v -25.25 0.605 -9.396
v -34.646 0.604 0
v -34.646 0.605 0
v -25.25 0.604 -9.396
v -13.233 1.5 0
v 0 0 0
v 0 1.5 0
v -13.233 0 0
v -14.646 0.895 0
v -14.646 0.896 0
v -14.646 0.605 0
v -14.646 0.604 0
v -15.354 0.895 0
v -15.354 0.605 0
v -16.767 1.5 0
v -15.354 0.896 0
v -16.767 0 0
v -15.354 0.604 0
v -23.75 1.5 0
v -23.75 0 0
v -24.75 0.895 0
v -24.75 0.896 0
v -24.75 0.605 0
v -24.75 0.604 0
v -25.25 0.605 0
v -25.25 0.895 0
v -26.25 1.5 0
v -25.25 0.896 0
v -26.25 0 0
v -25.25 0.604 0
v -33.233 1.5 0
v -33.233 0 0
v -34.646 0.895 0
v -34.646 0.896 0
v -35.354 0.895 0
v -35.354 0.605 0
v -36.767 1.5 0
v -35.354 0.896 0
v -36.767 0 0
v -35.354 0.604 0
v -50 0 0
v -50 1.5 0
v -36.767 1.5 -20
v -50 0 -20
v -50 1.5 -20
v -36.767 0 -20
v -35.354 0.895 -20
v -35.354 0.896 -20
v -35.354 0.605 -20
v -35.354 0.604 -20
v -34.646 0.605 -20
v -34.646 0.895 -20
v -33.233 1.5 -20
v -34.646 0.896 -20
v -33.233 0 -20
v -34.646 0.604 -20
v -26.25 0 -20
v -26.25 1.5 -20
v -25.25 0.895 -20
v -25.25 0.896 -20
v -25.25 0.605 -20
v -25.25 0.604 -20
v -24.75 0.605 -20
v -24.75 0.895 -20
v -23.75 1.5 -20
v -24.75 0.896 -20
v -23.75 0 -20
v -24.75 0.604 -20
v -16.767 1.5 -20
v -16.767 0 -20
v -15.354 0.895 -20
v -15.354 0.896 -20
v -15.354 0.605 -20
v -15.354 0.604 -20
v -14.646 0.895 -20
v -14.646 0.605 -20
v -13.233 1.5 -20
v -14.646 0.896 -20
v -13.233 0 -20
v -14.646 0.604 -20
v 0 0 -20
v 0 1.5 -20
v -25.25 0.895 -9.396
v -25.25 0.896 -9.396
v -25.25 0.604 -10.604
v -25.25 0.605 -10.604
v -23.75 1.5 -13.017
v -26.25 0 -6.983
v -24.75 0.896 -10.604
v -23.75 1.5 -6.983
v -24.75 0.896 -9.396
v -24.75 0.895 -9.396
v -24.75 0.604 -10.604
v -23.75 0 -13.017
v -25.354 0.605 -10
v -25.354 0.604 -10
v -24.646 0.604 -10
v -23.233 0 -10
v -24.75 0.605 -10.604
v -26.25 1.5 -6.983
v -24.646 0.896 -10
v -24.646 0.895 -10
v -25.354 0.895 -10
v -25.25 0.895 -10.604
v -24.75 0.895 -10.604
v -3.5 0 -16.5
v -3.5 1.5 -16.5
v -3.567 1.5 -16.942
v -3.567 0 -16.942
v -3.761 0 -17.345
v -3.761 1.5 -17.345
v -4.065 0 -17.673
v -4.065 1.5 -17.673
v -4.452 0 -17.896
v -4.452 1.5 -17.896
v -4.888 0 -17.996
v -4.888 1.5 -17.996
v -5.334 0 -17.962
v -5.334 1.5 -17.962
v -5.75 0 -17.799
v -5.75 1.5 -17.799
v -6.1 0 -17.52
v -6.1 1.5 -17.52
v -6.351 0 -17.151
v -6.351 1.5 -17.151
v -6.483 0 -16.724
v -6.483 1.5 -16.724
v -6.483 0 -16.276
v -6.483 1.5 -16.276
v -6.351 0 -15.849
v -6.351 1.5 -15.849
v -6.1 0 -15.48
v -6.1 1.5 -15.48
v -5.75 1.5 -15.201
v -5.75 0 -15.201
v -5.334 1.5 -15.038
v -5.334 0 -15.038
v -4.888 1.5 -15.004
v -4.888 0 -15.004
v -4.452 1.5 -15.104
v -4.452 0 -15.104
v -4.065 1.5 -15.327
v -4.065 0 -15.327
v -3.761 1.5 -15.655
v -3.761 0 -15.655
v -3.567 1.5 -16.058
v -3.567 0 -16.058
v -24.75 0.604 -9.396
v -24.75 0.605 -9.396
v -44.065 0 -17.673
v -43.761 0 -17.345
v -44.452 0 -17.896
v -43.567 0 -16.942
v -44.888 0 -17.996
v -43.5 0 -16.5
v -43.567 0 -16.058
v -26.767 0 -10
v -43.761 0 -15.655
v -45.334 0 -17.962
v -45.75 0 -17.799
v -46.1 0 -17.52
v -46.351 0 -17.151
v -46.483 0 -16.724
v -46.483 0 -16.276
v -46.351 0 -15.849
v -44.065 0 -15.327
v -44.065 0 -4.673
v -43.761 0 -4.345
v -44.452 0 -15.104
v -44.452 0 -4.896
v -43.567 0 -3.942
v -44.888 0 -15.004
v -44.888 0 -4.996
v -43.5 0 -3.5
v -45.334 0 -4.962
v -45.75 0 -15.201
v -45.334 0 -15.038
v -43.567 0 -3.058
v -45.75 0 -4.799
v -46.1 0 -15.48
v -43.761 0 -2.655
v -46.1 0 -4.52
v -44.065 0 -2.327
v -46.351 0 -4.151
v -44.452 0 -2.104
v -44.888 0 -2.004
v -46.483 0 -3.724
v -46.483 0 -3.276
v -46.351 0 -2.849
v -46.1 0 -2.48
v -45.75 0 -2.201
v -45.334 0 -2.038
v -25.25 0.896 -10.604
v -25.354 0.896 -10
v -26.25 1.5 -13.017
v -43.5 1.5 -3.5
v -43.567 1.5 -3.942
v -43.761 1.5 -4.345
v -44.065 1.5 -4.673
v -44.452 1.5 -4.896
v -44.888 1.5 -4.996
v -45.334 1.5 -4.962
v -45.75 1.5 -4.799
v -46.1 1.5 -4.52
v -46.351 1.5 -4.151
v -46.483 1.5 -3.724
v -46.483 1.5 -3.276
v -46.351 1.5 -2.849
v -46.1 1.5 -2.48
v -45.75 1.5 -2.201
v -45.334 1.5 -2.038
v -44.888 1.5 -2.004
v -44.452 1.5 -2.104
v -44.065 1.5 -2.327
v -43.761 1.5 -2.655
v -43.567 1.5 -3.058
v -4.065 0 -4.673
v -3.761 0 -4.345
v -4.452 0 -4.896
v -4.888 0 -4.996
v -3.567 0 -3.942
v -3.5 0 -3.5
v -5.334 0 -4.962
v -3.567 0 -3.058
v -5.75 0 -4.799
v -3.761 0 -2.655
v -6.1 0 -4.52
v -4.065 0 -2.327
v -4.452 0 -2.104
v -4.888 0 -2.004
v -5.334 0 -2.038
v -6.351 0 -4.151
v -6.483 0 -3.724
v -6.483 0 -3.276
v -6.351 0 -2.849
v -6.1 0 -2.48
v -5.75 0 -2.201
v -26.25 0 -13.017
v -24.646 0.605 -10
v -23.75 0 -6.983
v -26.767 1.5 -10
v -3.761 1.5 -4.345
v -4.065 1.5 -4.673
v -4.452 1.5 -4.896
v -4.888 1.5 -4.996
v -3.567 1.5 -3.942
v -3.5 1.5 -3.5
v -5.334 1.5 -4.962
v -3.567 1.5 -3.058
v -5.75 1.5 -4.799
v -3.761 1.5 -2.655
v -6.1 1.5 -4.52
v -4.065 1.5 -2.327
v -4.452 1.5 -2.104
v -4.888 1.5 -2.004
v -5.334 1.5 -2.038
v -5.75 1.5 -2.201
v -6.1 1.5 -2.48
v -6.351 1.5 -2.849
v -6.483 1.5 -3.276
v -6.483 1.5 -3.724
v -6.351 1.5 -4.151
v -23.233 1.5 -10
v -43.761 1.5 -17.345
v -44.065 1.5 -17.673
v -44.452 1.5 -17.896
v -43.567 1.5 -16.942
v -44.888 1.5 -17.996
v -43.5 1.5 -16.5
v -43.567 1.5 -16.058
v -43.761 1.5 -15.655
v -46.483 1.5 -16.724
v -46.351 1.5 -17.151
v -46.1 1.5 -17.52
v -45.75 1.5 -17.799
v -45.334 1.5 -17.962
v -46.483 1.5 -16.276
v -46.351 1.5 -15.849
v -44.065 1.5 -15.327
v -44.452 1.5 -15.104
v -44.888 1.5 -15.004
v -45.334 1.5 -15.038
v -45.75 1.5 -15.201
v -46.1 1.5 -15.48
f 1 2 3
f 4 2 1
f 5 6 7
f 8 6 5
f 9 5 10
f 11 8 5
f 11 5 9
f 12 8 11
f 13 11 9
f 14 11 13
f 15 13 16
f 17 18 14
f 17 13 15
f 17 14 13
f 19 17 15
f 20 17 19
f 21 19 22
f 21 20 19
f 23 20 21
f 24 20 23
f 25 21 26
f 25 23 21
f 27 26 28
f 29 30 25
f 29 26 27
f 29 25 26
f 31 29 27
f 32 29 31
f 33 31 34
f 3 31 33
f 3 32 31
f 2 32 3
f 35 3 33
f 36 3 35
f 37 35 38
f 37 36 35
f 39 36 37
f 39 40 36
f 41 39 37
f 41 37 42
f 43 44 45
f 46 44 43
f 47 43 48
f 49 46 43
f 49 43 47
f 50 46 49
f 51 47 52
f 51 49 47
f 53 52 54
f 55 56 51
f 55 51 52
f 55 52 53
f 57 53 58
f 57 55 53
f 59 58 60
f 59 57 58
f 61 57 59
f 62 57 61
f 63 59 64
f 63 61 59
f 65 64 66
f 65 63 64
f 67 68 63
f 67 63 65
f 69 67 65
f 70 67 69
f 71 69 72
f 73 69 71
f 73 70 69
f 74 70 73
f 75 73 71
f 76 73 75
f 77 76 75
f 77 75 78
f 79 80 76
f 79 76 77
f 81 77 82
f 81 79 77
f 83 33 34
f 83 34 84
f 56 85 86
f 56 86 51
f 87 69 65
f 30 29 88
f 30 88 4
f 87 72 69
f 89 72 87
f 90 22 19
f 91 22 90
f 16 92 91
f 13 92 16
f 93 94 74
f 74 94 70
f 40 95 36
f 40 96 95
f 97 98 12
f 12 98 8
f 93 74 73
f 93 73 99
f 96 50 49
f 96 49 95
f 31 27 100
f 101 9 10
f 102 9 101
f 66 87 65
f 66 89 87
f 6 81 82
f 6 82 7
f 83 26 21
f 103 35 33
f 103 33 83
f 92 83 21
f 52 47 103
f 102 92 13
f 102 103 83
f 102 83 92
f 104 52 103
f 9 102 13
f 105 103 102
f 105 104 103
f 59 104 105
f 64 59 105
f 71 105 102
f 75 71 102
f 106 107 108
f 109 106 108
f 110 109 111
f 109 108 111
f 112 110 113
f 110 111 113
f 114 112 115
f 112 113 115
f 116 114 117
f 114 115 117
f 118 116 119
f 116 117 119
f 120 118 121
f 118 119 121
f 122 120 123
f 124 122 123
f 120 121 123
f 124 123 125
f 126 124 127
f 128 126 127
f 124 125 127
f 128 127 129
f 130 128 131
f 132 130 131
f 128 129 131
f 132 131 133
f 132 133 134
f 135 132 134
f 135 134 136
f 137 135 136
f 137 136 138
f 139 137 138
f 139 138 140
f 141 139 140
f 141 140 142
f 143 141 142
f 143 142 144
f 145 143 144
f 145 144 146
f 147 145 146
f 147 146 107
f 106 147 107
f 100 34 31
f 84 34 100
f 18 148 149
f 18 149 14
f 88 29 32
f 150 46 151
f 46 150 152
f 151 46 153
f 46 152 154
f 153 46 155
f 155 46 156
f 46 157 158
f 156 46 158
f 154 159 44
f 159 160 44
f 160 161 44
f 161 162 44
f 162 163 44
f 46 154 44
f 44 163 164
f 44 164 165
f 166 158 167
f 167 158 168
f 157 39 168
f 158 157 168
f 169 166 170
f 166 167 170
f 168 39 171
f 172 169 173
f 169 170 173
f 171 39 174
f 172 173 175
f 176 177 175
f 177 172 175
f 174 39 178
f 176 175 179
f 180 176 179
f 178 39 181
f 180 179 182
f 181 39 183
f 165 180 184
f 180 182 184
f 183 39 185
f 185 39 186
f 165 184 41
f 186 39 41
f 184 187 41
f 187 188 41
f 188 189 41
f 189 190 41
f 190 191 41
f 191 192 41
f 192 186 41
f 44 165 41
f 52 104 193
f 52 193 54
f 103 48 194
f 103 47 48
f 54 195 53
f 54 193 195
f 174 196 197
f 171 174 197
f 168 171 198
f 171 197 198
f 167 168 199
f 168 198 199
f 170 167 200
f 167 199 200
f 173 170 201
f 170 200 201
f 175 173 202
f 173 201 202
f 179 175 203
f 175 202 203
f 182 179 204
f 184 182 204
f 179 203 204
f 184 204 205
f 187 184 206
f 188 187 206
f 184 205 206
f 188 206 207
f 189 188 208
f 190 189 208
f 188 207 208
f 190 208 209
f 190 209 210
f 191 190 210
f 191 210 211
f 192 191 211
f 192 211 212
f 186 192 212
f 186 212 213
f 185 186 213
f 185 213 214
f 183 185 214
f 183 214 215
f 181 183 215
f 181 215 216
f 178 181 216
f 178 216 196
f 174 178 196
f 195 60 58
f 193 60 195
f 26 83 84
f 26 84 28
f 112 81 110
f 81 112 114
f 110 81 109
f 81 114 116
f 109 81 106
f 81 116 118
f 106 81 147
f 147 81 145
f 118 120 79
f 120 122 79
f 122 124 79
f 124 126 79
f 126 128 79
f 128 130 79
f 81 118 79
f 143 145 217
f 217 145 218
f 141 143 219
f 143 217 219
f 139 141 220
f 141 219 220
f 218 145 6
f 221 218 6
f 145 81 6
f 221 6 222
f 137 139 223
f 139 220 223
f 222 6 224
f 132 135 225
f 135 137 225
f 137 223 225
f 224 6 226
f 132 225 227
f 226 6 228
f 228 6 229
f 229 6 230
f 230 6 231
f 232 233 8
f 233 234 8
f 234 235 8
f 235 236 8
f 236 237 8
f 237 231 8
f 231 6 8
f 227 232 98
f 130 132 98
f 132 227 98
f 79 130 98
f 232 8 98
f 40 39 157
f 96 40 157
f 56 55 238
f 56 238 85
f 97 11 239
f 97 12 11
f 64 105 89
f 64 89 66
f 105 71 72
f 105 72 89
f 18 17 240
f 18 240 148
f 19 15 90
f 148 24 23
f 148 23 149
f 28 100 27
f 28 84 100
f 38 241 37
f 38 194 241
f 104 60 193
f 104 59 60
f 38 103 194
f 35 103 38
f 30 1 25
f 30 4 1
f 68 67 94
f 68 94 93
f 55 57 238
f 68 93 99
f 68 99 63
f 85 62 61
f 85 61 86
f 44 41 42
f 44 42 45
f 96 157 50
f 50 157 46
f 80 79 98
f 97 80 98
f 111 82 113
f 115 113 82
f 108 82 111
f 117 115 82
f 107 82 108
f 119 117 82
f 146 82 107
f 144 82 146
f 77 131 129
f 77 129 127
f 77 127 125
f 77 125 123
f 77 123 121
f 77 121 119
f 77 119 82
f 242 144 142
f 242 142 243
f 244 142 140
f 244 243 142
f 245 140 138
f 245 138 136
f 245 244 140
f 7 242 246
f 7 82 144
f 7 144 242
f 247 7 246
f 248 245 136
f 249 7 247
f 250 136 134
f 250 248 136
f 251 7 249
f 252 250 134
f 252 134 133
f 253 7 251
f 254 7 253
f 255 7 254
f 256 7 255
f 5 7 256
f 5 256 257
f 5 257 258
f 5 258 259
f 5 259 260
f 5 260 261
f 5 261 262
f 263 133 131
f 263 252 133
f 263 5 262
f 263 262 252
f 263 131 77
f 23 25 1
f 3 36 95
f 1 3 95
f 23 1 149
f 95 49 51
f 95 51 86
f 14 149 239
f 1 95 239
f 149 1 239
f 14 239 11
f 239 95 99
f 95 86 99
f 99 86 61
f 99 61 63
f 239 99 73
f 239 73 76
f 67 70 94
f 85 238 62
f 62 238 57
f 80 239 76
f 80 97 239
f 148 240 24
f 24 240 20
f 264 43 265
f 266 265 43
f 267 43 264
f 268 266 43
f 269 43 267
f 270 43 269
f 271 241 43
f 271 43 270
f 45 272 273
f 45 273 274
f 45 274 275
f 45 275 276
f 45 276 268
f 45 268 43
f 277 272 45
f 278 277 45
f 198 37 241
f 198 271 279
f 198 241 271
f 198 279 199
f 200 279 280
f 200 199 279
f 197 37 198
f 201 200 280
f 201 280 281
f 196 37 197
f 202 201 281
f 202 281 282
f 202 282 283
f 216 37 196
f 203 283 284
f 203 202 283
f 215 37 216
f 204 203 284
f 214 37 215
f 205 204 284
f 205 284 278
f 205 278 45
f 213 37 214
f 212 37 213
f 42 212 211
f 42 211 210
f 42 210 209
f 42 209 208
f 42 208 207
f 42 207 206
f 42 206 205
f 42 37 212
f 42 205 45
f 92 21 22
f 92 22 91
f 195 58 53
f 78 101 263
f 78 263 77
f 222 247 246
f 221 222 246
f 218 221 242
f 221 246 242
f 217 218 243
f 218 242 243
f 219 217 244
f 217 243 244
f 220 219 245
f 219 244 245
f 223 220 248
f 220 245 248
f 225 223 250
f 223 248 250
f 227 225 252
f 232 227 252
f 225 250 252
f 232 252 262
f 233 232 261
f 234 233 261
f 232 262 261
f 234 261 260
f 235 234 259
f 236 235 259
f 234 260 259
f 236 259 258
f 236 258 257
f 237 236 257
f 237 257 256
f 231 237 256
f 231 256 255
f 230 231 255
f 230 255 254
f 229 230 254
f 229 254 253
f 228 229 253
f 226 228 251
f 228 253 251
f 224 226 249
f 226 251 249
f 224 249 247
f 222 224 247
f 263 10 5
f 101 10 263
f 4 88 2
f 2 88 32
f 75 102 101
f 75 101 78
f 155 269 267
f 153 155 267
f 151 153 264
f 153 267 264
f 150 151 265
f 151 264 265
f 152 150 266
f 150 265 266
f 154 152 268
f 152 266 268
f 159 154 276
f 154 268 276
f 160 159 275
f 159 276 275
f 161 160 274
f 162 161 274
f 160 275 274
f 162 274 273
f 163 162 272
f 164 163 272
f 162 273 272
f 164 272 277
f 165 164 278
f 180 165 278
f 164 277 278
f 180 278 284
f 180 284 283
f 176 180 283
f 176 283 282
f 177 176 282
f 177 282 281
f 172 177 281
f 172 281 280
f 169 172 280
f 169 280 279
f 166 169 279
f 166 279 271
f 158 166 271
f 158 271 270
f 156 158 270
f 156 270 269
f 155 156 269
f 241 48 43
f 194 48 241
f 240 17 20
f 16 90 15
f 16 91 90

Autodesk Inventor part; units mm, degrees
ref_plane "YZ Plane" through (0, 0, 0) normal (1, 0, 0) x (0, 1, 0)
ref_plane "XZ Plane" through (0, 0, 0) normal (0, 1, 0) x (-1, 0, 0)
ref_plane "XY Plane" through (0, 0, 0) normal (0, 0, 1) x (1, 0, 0)
sketch "Sketch1" plane through (0, 0, 0) normal (0, 1, 0) x (-1, 0, 0)
  line L0 (0, 0) -> (50, 0)
  line L1 (50, 0) -> (50, -20)
  line L2 (50, -20) -> (0, -20)
  line L3 (0, -20) -> (0, 0)
  line L4 (25, 0) -> (25, -20)
  line L5 (25, -20) -> (35, -20)
  line L6 (25, 0) -> (35, 0)
  line L7 (25, 0) -> (15, 0)
  line L8 (25, -20) -> (15, -20)
  line L9 (15, -20) -> (25, -10)
  line L10 (25, -10) -> (15, 0)
  line L11 (25, -10) -> (35, -20)
  line L12 (25, -10) -> (35, 0)
  line L13 (25.25, 2.5) -> (24.75, 2.5)
  line L14 (24.75, 2.5) -> (24.75, -22.5)
  line L15 (24.75, -22.5) -> (25.25, -22.5)
  line L16 (25.25, -22.5) -> (25.25, 2.5)
  line L17 (25.25, 2.5) -> (24.75, -22.5) construction
  line L18 (24.75, 2.5) -> (25.25, -22.5) construction
  line L19 (7.4991, 7.8544) -> (7.1456, 7.5009)
  line L20 (7.1456, 7.5009) -> (42.5009, -27.8544)
  line L21 (42.5009, -27.8544) -> (42.8544, -27.5009)
  line L22 (42.8544, -27.5009) -> (7.4991, 7.8544)
  line L23 (7.4991, 7.8544) -> (42.5009, -27.8544) construction
  line L24 (7.1456, 7.5009) -> (42.8544, -27.5009) construction
  line L25 (42.8544, 7.5009) -> (42.5009, 7.8544)
  line L26 (42.5009, 7.8544) -> (7.1456, -27.5009)
  line L27 (7.1456, -27.5009) -> (7.4991, -27.8544)
  line L28 (7.4991, -27.8544) -> (42.8544, 7.5009)
  line L29 (42.8544, 7.5009) -> (7.1456, -27.5009) construction
  line L30 (42.5009, 7.8544) -> (7.4991, -27.8544) construction
  point P0 (14.6464, -20)
  point P1 (24.6464, -10)
  point P2 (14.6464, 0)
  point P3 (24.75, -10.6036)
  point P4 (15.3536, -20)
  point P5 (24.75, -20)
  point P6 (34.6464, -20)
  point P7 (25.25, -10.6036)
  point P8 (25.25, -20)
  point P9 (15.3536, 0)
  point P10 (24.75, -9.3964)
  point P11 (24.75, 0)
  point P12 (25.25, -9.3964)
  point P13 (34.6464, 0)
  point P14 (25.25, 0)
  point P15 (35.3536, 0)
  point P16 (25.3536, -10)
  point P17 (35.3536, -20)
  dimension "d0" = 50
  dimension "d1" = 20
  dimension "d2" = 10
  dimension "d3" = 10
  dimension "d4" = 10
  dimension "d5" = 10
  dimension "d6" = 0.5
  dimension "d7" = 25
  dimension "d8" = 0.5
  dimension "d9" = 50
  dimension "d10" = 0.5
  dimension "d11" = 50
extrude "Extrusion1" add sketch "Sketch1" along normal blind 1.5 contours L0 L20 L26 L2 L3 | L0 L14 L22 | L28 L14 L2 | L0 L26 L16 | L20 L2 L16 | L28 L0 L1 L2 L22
ref_plane "Work Plane1" through (0, 0.75, 0) normal (0, 1, 0) x (1, 0, 0)
sketch "Sketch2" plane through (0, 0.75, 0) normal (0, 1, 0) x (1, 0, 0)
  line L0 (-50, 20) -> (-50, 0) projected
  line L1 (-35.3536, 20) -> (-50, 20) projected
  line L2 (-25.3536, 10) -> (-35.3536, 20) projected
  line L3 (-35.3536, 0) -> (-25.3536, 10) projected
  line L4 (-50, 0) -> (-35.3536, 0) projected
  line L5 (-25.25, 9.3964) -> (-34.6464, 0) projected
  line L6 (-25.25, 0) -> (-25.25, 9.3964) projected
  line L7 (-34.6464, 0) -> (-25.25, 0) projected
  line L8 (-24.75, 9.3964) -> (-24.75, 0) projected
  line L9 (-15.3536, 0) -> (-24.75, 9.3964) projected
  line L10 (-24.75, 0) -> (-15.3536, 0) projected
  line L11 (-24.6464, 10) -> (-14.6464, 0) projected
  line L12 (-14.6464, 20) -> (-24.6464, 10) projected
  line L13 (0, 20) -> (-14.6464, 20) projected
  line L14 (0, 0) -> (0, 20) projected
  line L15 (-14.6464, 0) -> (0, 0) projected
  line L16 (-15.3536, 20) -> (-24.75, 20) projected
  line L17 (-24.75, 10.6036) -> (-15.3536, 20) projected
  line L18 (-24.75, 20) -> (-24.75, 10.6036) projected
  line L19 (-25.25, 20) -> (-34.6464, 20) projected
  line L20 (-25.25, 10.6036) -> (-25.25, 20) projected
  line L21 (-34.6464, 20) -> (-25.25, 10.6036) projected
  line L22 (-50, 0) -> (-35.3536, 0) projected
  line L23 (-50, 0) -> (0, 0)
  line L24 (-50, 20) -> (0, 20)
extrude "Extrusion2" add sketch "Sketch2" along normal mid plane 0.29 contours L24 L21 L20 L18 L17 L12 L11 L23 L9 L8 L6 L5 L3 L2
chamfer "Chamfer1" distance 1 distance2 0.605 1 edges at (-30.3536, 1.5, -5) measured on face at (-40.2357, 1.5, -13.3333)
chamfer "Chamfer2" distance 1 distance2 0.605 1 edges at (-29.9482, 1.5, -4.6982) measured on face at (-28.3821, 1.5, -3.1321)
chamfer "Chamfer3" distance 1 distance2 0.605 1 edges at (-30.7069, 1.5, -15.3534) measured on face at (-40.7069, 1.5, -13.3333)
chamfer "Chamfer4" distance 1 distance2 0.605 1 edges at (-29.9482, 1.5, -15.3018) measured on face at (-28.3821, 1.5, -16.8679)
chamfer "Chamfer5" distance 1 distance2 0.605 1 edges at (-25.25, 1.5, -16.0085) measured on face at (-27.911, 1.5, -17.339)
chamfer "Chamfer6" distance 1 distance2 0.605 1 edges at (-24.75, 1.5, -15.3018) measured on face at (-21.6179, 1.5, -16.8679)
chamfer "Chamfer7" distance 1 distance2 0.605 1 edges at (-25.25, 1.5, -3.9915) measured on face at (-27.911, 1.5, -2.661)
chamfer "Chamfer8" distance 1 distance2 0.605 1 edges at (-24.75, 1.5, -4.6982) measured on face at (-21.6179, 1.5, -3.1321)
chamfer "Chamfer9" distance 1 distance2 0.605 1 edges at (-19.552, 1.5, -4.1985) measured on face at (-20.9515, 1.5, -2.799)
chamfer "Chamfer10" distance 1 distance2 0.605 1 edges at (-19.6464, 1.5, -5) measured on face at (-9.7643, 1.5, -6.6667)
chamfer "Chamfer11" distance 1 distance2 0.605 1 edges at (-19.552, 1.5, -15.8015) measured on face at (-20.9515, 1.5, -17.201)
chamfer "Chamfer12" distance 1 distance2 0.605 1 edges at (-19.2931, 1.5, -15.3534) measured on face at (-9.2931, 1.5, -13.3333)
chamfer "Chamfer13" distance 0.605 distance2 1 1 edges at (-29.9482, 0, -15.3018) measured on face at (-31.5143, 0.2017, -16.8679)
chamfer "Chamfer14" distance 0.605 distance2 1 1 edges at (-30.3536, 0, -15) measured on face at (-28.6869, 0.2017, -13.3333)
chamfer "Chamfer15" distance 0.605 distance2 1 1 edges at (-25.25, 0, -16.0085) measured on face at (-25.25, 0.4033, -14.2069)
chamfer "Chamfer16" distance 0.605 distance2 1 1 edges at (-24.75, 0, -15.3018) measured on face at (-24.75, 0.2017, -16.8679)
chamfer "Chamfer17" distance 0.605 distance2 1 1 edges at (-19.552, 0, -15.8015) measured on face at (-21.2847, 0.4033, -14.0689)
chamfer "Chamfer18" distance 0.605 distance2 1 1 edges at (-19.6464, 0, -15) measured on face at (-17.9798, 0.2017, -16.6667)
chamfer "Chamfer19" distance 0.605 distance2 1 1 edges at (-19.2931, 0, -4.6466) measured on face at (-21.0775, 0.4033, -6.4311)
chamfer "Chamfer20" distance 0.605 distance2 1 1 edges at (-20.0518, 0, -4.6982) measured on face at (-18.4857, 0.2017, -3.1321)
chamfer "Chamfer21" distance 0.605 distance2 1 1 edges at (-24.75, 0, -3.9915) measured on face at (-24.75, 0.4033, -5.7931)
chamfer "Chamfer22" distance 0.605 distance2 1 1 edges at (-25.25, 0, -4.6982) measured on face at (-25.25, 0.2017, -3.1321)
chamfer "Chamfer23" distance 0.605 distance2 1 1 edges at (-30.448, 0, -4.1985) measured on face at (-28.7153, 0.4033, -5.9311)
chamfer "Chamfer24" distance 0.605 distance2 1 1 edges at (-30.7069, 0, -4.6466) measured on face at (-28.9225, 0.4033, -6.4311)
sketch "Sketch3" plane through (0, 1.5, 0) normal (0, 1, 0) x (1, 0, 0)
  line L0 (-36.7678, 20) -> (-26.7678, 10) projected
  line L1 (-36.7678, 20) -> (-50, 20) projected
  line L2 (-50, 20) -> (-50, 0) projected
  line L3 (-50, 0) -> (-36.7678, 0) projected
  line L4 (-26.7678, 10) -> (-36.7678, 0) projected
  line L5 (-23.2322, 10) -> (-13.2322, 20) projected
  line L6 (-13.2322, 0) -> (-23.2322, 10) projected
  line L7 (-13.2322, 0) -> (0, 0) projected
  line L8 (0, 0) -> (0, 20) projected
  line L9 (0, 20) -> (-13.2322, 20) projected
  line L10 (-26.7678, 10) -> (-23.2322, 10)
  line L11 (-45, 16.5) -> (-45, 3.5)
  line L12 (-45, 3.5) -> (-5, 3.5)
  line L13 (-5, 3.5) -> (-5, 16.5)
  line L14 (-5, 16.5) -> (-45, 16.5)
  line L15 (-45, 16.5) -> (-5, 3.5) construction
  line L16 (-45, 3.5) -> (-5, 16.5) construction
  line L17 (-50, 0) -> (-36.7678, 0) projected
  circle A0 centre (-45, 16.5) radius 1.5
  circle A1 centre (-45, 3.5) radius 1.5
  circle A2 centre (-5, 16.5) radius 1.5
  circle A3 centre (-5, 3.5) radius 1.5
  point P0 (-25, 10)
  dimension "d88" = 13
  dimension "d89" = 40
  dimension "d90" = 3
  dimension "d91" = 3
  dimension "d92" = 3
  dimension "d93" = 3
extrude "Extrusion3" cut sketch "Sketch3" against normal blind 4 contours A0 L11 L14 | L14 L11 A0 | A2 L13 L14 | L14 L13 A2 | A1 L11 L12 | L12 L11 A1 | A3 L13 L12 | L12 L13 A3
properties part number "test_hangle_org_2"
